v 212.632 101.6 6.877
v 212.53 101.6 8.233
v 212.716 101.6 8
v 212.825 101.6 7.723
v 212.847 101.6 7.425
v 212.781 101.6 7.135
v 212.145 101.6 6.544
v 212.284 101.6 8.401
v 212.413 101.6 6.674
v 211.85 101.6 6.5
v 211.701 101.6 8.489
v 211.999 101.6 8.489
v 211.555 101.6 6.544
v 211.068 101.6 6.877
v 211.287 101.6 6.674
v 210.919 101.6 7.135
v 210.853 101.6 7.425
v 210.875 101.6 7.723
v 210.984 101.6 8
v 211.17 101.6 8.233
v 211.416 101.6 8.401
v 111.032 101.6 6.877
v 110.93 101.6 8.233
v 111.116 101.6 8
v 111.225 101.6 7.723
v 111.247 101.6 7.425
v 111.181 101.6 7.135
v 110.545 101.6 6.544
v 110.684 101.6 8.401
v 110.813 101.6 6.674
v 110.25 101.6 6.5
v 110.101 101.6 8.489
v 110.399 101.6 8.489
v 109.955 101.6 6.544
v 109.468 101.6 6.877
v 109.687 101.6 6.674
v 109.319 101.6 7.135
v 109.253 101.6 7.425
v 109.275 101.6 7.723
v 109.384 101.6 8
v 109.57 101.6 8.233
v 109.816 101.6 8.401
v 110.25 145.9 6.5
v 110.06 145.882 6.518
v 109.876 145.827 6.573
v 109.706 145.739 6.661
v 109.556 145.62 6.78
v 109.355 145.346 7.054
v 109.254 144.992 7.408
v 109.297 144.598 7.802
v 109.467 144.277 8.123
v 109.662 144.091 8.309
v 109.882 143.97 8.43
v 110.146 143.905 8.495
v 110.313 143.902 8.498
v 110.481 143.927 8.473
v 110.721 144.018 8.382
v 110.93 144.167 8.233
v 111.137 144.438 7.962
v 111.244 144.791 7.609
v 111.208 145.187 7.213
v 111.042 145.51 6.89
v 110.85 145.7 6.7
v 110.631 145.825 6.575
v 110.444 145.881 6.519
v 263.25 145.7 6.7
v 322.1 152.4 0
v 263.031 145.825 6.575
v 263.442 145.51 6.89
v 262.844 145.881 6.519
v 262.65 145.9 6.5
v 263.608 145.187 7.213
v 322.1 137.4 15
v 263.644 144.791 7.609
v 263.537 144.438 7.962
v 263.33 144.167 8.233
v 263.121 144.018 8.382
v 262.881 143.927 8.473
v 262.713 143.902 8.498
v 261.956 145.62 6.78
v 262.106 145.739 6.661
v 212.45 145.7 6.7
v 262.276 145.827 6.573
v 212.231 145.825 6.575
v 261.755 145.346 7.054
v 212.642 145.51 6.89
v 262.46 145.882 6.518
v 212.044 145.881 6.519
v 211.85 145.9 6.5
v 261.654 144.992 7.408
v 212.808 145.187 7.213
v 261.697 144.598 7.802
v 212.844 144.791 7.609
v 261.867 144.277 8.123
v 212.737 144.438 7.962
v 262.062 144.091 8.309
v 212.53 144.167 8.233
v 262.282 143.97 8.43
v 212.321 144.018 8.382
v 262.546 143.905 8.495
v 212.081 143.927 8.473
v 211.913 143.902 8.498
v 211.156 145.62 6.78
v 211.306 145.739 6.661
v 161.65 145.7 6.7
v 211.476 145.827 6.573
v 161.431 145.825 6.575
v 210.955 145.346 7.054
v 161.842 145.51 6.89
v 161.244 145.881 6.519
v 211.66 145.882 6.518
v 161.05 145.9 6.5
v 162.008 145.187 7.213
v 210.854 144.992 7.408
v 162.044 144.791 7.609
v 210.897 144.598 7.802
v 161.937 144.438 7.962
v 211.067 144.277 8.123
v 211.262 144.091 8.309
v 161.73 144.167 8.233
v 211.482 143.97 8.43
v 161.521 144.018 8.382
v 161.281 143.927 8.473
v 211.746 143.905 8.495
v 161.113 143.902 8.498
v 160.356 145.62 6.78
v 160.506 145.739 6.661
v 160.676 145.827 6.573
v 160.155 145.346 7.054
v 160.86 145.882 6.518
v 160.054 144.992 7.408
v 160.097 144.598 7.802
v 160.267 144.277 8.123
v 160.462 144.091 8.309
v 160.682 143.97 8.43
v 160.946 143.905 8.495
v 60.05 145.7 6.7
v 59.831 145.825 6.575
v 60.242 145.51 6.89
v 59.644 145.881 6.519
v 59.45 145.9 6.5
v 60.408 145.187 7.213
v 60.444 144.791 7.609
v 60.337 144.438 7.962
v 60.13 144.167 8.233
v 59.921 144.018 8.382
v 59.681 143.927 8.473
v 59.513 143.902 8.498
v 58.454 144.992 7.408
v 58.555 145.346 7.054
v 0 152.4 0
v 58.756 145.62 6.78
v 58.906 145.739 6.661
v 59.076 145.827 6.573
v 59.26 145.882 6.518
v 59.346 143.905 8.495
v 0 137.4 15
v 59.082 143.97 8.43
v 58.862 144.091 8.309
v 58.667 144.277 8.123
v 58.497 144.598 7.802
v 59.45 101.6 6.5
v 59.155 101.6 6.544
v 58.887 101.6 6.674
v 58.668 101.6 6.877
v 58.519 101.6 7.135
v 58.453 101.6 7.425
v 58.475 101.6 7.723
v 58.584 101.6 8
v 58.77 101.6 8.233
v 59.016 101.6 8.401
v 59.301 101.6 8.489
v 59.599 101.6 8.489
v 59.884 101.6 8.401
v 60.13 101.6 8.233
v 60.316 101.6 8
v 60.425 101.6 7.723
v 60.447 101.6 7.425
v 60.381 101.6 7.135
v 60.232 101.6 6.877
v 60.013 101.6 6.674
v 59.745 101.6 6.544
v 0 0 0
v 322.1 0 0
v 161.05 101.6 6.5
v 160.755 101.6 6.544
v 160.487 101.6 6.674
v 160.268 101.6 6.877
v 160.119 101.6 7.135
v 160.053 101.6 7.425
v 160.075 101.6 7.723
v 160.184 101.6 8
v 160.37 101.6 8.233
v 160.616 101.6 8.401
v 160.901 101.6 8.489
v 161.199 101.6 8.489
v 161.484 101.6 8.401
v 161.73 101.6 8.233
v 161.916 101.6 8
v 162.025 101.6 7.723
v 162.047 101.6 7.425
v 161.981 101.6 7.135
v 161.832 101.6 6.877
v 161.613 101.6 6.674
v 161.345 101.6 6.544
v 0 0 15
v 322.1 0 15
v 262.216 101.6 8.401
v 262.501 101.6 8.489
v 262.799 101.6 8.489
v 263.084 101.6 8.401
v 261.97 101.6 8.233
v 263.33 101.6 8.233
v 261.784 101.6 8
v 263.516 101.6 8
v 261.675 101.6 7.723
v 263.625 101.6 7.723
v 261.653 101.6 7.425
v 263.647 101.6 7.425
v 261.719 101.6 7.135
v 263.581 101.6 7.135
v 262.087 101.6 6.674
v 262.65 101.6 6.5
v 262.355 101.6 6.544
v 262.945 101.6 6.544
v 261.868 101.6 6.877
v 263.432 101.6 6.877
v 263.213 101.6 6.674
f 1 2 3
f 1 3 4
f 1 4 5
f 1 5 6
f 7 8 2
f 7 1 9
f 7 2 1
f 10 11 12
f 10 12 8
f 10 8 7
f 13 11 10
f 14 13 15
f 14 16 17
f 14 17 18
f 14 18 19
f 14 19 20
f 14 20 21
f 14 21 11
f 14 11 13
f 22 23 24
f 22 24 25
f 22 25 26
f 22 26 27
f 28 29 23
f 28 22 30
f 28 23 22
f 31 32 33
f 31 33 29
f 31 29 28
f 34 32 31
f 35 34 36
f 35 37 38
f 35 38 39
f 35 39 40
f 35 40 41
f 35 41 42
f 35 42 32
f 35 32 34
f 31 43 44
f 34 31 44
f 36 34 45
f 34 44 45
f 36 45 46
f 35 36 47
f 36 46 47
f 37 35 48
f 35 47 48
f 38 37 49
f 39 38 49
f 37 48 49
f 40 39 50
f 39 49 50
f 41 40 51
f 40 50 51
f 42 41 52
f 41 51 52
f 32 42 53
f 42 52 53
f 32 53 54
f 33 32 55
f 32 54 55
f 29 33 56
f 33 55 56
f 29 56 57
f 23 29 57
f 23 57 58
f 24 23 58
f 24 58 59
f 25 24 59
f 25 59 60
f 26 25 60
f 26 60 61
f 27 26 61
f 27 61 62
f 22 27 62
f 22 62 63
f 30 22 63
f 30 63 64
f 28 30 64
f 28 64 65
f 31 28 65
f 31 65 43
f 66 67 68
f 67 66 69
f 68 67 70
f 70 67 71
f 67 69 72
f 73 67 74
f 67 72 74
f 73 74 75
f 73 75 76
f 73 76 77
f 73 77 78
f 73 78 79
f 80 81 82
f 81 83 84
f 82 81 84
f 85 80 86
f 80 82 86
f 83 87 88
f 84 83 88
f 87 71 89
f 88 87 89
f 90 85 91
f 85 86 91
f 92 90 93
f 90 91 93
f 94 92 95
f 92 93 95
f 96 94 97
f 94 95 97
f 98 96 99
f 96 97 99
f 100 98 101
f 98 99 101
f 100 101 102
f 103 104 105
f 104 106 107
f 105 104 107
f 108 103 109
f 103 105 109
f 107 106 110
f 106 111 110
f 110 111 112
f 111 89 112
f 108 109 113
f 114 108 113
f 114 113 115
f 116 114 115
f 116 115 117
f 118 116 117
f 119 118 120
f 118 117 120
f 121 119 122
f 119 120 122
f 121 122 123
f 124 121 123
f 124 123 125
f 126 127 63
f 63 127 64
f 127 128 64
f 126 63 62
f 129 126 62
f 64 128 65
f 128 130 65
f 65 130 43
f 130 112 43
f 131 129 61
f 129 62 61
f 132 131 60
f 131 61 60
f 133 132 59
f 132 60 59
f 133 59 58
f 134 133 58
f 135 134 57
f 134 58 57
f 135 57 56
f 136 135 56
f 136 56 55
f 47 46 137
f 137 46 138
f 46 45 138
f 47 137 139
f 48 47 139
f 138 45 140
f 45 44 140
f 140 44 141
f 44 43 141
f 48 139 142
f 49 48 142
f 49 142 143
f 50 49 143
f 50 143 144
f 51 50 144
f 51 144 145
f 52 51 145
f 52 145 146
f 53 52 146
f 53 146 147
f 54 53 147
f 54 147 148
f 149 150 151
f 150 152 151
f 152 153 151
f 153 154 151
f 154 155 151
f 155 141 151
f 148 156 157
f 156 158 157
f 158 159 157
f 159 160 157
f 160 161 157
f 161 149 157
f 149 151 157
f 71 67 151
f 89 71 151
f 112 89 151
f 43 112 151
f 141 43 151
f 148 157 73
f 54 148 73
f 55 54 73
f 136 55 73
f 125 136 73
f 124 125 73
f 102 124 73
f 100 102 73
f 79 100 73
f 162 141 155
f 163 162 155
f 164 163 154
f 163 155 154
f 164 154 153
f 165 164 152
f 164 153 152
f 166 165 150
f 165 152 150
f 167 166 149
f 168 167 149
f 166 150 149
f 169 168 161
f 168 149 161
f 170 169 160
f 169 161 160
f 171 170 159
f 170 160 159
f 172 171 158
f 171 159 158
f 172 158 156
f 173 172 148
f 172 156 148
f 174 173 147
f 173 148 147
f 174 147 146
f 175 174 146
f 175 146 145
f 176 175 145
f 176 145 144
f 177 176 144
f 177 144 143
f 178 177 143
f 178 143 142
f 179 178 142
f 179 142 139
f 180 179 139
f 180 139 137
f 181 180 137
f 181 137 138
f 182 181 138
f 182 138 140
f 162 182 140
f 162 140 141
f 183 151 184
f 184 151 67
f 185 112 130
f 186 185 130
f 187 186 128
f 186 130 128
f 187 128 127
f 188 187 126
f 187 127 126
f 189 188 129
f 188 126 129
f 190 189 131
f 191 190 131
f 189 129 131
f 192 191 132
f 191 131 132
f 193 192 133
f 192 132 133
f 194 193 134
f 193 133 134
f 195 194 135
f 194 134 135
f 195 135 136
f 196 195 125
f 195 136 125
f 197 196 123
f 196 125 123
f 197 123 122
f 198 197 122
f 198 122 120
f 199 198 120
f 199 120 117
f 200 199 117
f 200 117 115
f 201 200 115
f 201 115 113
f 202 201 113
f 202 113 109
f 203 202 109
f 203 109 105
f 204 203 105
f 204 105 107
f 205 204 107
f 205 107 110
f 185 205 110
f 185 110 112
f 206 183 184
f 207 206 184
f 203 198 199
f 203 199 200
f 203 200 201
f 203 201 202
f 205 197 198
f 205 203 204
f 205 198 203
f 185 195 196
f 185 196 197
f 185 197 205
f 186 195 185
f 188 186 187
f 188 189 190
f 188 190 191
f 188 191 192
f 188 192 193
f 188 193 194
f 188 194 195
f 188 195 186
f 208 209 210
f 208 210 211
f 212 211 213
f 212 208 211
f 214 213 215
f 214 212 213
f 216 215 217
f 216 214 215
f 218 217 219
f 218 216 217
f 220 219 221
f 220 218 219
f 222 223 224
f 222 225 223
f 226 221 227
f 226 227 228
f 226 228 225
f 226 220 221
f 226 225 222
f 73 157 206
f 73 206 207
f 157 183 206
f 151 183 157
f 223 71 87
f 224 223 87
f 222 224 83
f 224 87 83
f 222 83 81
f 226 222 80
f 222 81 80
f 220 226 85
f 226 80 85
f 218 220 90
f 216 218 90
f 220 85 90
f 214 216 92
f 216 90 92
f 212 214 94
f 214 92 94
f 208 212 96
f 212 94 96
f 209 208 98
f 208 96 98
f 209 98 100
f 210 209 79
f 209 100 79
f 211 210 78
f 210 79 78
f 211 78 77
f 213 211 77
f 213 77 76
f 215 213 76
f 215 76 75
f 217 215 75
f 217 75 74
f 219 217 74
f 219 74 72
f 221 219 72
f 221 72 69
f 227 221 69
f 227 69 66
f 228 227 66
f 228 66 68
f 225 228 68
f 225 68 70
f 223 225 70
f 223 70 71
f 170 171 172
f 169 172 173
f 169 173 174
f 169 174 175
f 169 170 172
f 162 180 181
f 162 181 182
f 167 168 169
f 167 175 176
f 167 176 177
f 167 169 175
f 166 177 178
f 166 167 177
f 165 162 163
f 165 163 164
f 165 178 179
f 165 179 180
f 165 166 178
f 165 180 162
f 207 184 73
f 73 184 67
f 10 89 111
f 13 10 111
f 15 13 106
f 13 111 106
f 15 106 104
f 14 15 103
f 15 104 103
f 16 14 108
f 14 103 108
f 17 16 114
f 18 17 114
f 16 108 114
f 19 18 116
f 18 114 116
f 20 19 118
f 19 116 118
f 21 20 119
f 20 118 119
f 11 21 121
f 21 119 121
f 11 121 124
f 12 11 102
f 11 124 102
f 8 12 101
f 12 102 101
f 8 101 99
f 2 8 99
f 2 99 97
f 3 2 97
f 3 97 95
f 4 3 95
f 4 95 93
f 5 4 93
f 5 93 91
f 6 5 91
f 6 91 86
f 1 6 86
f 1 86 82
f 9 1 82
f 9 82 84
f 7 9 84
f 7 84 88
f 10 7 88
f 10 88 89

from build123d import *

# Parameters (mm, degrees)
SKETCH_1_W          = 322.1
SKETCH_1_H          = 152.4
EXTRUDE_1_DEPTH     = 15
CUT_EXTRUDE_START   = 152.4
SKETCH_2_R          = 1
CUT_EXTRUDE_1_DEPTH = 50.8
CUT_EXTRUDE_2_DEPTH = 357.649926398


with BuildPart() as part:
    # 草图1 → 凸台-拉伸1 (new body)
    with BuildSketch(Plane.XY):
        with Locations((161.05, 76.2)):
            Rectangle(SKETCH_1_W, SKETCH_1_H)
    extrude(amount=EXTRUDE_1_DEPTH)

    # 草图2 → 切除-拉伸1 (cut)
    with BuildSketch(Plane(origin=(0, 0, 0), x_dir=(1, 0, 0), z_dir=(0, 1, 0)).offset(CUT_EXTRUDE_START)):
        with Locations(Location((161.05, -7.5, 0), (0, 0, 90))):
            Circle(SKETCH_2_R)
        with Locations(Location((211.85, -7.5, 0), (0, 0, 90))):
            Circle(SKETCH_2_R)
        with Locations(Location((262.65, -7.5, 0), (0, 0, 90))):
            Circle(SKETCH_2_R)
        with Locations(Location((110.25, -7.5, 0), (0, 0, 90))):
            Circle(SKETCH_2_R)
        with Locations(Location((59.45, -7.5, 0), (0, 0, 90))):
            Circle(SKETCH_2_R)
    extrude(amount=-CUT_EXTRUDE_1_DEPTH, mode=Mode.SUBTRACT)

    # 草图3 → 切除-拉伸2 (cut, through all)
    with BuildSketch(Plane.ZY):
        Polygon((0, 152.4), (15, 137.4), (15, 152.4), align=None)
    extrude(amount=-CUT_EXTRUDE_2_DEPTH, mode=Mode.SUBTRACT)


solid = part.part
